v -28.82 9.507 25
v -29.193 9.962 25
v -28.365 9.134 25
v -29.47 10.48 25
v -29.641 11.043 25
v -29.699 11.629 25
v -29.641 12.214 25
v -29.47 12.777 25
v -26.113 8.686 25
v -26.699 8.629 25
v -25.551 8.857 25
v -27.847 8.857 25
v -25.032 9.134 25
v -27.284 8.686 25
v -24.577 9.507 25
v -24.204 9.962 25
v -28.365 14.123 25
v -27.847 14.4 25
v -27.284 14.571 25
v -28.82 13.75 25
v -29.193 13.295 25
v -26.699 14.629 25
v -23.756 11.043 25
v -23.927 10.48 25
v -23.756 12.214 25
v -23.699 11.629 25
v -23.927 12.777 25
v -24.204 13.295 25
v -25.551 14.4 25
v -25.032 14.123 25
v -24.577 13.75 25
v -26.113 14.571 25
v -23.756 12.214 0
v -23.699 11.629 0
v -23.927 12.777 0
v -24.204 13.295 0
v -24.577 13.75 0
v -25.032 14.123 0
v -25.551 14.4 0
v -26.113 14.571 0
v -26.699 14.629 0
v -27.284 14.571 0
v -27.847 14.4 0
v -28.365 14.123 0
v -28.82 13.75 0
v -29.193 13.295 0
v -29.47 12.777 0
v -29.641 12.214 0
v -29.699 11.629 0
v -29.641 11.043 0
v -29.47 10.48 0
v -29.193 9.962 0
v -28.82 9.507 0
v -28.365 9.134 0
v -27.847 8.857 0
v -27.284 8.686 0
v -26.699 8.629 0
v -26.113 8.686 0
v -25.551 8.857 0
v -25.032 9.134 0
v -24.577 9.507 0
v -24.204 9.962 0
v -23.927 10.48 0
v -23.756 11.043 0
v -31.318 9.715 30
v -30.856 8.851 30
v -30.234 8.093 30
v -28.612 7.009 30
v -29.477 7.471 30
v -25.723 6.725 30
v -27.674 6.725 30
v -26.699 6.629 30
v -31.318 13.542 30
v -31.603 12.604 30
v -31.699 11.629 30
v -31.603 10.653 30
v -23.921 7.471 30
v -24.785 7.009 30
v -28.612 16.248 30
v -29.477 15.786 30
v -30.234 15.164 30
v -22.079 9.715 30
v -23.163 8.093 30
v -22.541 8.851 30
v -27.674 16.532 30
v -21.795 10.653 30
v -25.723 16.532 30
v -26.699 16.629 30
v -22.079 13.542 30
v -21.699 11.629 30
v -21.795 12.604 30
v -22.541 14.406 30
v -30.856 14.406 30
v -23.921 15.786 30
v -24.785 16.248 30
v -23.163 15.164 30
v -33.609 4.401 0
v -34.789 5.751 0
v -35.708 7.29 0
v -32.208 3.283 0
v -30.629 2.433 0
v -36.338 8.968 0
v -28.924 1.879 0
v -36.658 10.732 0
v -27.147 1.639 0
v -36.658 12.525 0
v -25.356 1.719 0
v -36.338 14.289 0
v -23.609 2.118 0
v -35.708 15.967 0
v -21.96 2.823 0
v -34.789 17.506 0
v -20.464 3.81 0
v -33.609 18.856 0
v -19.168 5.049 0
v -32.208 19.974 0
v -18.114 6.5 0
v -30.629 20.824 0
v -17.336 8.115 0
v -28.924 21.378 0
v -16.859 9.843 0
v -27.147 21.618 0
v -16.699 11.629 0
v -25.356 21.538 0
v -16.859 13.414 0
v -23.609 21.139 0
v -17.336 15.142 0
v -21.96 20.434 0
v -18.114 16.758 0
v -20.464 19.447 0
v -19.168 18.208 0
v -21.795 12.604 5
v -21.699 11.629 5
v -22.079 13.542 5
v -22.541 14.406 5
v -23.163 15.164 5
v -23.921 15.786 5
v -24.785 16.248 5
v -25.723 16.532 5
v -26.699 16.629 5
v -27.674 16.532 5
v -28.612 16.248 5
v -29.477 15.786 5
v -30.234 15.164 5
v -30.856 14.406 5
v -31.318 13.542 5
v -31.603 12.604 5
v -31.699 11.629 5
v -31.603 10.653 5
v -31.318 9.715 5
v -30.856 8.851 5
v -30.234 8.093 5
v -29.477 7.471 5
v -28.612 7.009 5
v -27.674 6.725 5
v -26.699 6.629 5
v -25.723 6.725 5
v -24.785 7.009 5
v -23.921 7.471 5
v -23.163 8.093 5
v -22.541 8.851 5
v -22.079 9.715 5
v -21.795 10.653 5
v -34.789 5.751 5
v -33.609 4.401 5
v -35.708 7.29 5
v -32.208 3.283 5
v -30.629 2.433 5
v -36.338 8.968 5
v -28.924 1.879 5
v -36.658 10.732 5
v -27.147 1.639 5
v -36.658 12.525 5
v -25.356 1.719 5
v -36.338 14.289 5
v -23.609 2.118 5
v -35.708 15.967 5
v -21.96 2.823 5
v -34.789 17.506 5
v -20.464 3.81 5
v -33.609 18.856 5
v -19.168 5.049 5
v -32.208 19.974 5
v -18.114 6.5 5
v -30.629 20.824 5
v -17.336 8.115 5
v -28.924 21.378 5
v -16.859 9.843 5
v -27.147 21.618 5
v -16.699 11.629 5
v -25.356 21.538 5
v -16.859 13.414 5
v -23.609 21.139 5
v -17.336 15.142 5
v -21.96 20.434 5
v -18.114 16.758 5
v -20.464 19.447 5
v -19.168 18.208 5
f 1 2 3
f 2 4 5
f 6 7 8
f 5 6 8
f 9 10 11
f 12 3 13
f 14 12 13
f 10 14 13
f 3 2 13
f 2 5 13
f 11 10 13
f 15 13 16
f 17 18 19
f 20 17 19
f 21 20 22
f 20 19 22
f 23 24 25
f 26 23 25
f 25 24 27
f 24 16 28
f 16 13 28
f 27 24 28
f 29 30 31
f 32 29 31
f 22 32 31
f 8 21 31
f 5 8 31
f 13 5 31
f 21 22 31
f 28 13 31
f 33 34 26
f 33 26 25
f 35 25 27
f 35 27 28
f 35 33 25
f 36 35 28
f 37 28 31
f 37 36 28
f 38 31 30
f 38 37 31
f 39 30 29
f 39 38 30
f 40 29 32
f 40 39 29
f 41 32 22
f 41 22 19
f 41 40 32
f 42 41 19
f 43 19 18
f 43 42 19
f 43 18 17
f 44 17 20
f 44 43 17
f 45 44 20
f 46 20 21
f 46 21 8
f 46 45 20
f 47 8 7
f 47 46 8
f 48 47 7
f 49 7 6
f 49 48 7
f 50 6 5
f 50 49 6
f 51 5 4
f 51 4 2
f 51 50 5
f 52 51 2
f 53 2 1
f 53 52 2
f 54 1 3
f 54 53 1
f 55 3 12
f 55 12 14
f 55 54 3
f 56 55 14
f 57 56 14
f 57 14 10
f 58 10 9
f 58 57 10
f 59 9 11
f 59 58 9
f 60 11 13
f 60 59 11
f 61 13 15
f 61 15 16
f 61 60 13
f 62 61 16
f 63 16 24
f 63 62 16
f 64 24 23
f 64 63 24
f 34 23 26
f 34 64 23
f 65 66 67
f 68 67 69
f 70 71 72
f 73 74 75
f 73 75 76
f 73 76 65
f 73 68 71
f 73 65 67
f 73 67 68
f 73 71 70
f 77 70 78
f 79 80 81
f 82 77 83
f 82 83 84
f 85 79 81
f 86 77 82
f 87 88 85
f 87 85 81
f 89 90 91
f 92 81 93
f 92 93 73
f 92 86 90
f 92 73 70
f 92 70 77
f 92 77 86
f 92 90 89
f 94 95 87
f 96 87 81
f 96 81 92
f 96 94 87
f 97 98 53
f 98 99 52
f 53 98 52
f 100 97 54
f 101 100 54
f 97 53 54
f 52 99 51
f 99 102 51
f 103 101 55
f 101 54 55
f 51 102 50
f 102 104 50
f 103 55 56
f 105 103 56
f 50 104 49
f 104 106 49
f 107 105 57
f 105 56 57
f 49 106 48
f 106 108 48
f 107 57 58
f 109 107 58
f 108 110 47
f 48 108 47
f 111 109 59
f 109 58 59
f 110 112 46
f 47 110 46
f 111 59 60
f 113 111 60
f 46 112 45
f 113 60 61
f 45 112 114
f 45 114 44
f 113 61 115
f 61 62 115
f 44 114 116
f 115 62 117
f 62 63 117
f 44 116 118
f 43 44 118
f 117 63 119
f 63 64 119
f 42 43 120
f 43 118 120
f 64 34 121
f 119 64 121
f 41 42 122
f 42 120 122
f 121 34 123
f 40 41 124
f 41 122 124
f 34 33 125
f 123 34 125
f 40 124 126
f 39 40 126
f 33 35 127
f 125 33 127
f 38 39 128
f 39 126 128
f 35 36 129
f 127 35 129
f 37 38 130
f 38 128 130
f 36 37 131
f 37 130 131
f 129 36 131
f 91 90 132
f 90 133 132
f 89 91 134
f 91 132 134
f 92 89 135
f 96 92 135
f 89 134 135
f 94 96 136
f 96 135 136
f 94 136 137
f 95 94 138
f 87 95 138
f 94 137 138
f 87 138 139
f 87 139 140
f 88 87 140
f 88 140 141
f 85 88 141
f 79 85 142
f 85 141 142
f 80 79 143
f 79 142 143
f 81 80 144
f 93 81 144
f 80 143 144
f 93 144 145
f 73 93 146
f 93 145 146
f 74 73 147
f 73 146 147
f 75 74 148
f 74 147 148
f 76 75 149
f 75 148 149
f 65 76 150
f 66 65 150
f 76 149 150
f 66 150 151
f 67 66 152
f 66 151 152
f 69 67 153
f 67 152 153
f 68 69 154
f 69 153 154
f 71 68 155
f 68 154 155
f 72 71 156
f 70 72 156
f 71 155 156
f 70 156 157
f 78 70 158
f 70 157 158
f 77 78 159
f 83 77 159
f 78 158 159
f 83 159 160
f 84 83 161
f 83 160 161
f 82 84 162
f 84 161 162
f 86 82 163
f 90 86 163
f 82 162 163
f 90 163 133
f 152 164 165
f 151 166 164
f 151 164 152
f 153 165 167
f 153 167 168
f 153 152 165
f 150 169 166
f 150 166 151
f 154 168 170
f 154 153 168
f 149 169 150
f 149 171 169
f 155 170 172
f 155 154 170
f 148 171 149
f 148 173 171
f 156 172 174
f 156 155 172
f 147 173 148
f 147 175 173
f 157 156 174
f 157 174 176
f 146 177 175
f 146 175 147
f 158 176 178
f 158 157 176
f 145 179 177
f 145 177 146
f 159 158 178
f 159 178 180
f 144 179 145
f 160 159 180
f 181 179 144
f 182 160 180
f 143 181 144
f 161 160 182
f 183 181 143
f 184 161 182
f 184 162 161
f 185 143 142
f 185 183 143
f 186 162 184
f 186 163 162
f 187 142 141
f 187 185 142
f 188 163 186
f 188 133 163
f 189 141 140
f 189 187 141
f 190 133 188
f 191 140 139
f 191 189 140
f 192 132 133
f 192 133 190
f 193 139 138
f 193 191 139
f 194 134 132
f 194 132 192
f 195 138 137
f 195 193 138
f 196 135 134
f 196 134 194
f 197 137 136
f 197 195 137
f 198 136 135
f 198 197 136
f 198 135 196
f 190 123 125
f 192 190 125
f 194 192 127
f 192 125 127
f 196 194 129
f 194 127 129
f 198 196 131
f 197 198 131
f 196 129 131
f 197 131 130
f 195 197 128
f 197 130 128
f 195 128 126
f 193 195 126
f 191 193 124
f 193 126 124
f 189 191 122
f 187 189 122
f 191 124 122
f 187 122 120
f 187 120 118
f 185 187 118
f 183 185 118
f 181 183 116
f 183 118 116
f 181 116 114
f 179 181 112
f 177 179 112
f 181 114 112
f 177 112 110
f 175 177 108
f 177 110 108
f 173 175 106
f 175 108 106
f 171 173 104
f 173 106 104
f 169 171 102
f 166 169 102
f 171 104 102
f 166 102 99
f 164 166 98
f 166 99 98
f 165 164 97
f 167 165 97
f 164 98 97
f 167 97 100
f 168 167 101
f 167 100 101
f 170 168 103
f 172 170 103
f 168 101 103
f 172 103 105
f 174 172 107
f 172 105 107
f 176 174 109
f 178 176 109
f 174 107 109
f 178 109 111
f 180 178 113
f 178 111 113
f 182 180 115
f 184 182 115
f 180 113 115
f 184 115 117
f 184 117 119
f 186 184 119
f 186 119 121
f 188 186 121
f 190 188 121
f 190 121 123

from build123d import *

# Parameters (mm, degrees)
F0_R     = 10
F0_R_2   = 5
F1_DEPTH = 5
F0_R_3   = 3
F2_DEPTH = 25
F3_R     = 5
F4_DEPTH = 5


with BuildPart() as f1:
    # F0 (on Top) → F1 (new body)
    with BuildSketch(Plane.XY):
        with Locations((-26.698679, 11.628508)):
            Circle(F0_R)
        with Locations((-26.698679, 11.628508)):
            Circle(F0_R_2, mode=Mode.SUBTRACT)
    extrude(amount=F1_DEPTH)

    # F0 (on Top) → F2 (join)
    with BuildSketch(Plane.XY):
        with Locations((-26.698679, 11.628508)):
            Circle(F0_R_2)
        with Locations((-26.698679, 11.628508)):
            Circle(F0_R_3, mode=Mode.SUBTRACT)
    extrude(amount=F2_DEPTH)

    # F3 (on face) → F4 (join)
    with BuildSketch(Plane.XY.offset(25)):
        with Locations((-26.698679, 11.628508)):
            Circle(F3_R)
    extrude(amount=F4_DEPTH)


solid = f1.part
